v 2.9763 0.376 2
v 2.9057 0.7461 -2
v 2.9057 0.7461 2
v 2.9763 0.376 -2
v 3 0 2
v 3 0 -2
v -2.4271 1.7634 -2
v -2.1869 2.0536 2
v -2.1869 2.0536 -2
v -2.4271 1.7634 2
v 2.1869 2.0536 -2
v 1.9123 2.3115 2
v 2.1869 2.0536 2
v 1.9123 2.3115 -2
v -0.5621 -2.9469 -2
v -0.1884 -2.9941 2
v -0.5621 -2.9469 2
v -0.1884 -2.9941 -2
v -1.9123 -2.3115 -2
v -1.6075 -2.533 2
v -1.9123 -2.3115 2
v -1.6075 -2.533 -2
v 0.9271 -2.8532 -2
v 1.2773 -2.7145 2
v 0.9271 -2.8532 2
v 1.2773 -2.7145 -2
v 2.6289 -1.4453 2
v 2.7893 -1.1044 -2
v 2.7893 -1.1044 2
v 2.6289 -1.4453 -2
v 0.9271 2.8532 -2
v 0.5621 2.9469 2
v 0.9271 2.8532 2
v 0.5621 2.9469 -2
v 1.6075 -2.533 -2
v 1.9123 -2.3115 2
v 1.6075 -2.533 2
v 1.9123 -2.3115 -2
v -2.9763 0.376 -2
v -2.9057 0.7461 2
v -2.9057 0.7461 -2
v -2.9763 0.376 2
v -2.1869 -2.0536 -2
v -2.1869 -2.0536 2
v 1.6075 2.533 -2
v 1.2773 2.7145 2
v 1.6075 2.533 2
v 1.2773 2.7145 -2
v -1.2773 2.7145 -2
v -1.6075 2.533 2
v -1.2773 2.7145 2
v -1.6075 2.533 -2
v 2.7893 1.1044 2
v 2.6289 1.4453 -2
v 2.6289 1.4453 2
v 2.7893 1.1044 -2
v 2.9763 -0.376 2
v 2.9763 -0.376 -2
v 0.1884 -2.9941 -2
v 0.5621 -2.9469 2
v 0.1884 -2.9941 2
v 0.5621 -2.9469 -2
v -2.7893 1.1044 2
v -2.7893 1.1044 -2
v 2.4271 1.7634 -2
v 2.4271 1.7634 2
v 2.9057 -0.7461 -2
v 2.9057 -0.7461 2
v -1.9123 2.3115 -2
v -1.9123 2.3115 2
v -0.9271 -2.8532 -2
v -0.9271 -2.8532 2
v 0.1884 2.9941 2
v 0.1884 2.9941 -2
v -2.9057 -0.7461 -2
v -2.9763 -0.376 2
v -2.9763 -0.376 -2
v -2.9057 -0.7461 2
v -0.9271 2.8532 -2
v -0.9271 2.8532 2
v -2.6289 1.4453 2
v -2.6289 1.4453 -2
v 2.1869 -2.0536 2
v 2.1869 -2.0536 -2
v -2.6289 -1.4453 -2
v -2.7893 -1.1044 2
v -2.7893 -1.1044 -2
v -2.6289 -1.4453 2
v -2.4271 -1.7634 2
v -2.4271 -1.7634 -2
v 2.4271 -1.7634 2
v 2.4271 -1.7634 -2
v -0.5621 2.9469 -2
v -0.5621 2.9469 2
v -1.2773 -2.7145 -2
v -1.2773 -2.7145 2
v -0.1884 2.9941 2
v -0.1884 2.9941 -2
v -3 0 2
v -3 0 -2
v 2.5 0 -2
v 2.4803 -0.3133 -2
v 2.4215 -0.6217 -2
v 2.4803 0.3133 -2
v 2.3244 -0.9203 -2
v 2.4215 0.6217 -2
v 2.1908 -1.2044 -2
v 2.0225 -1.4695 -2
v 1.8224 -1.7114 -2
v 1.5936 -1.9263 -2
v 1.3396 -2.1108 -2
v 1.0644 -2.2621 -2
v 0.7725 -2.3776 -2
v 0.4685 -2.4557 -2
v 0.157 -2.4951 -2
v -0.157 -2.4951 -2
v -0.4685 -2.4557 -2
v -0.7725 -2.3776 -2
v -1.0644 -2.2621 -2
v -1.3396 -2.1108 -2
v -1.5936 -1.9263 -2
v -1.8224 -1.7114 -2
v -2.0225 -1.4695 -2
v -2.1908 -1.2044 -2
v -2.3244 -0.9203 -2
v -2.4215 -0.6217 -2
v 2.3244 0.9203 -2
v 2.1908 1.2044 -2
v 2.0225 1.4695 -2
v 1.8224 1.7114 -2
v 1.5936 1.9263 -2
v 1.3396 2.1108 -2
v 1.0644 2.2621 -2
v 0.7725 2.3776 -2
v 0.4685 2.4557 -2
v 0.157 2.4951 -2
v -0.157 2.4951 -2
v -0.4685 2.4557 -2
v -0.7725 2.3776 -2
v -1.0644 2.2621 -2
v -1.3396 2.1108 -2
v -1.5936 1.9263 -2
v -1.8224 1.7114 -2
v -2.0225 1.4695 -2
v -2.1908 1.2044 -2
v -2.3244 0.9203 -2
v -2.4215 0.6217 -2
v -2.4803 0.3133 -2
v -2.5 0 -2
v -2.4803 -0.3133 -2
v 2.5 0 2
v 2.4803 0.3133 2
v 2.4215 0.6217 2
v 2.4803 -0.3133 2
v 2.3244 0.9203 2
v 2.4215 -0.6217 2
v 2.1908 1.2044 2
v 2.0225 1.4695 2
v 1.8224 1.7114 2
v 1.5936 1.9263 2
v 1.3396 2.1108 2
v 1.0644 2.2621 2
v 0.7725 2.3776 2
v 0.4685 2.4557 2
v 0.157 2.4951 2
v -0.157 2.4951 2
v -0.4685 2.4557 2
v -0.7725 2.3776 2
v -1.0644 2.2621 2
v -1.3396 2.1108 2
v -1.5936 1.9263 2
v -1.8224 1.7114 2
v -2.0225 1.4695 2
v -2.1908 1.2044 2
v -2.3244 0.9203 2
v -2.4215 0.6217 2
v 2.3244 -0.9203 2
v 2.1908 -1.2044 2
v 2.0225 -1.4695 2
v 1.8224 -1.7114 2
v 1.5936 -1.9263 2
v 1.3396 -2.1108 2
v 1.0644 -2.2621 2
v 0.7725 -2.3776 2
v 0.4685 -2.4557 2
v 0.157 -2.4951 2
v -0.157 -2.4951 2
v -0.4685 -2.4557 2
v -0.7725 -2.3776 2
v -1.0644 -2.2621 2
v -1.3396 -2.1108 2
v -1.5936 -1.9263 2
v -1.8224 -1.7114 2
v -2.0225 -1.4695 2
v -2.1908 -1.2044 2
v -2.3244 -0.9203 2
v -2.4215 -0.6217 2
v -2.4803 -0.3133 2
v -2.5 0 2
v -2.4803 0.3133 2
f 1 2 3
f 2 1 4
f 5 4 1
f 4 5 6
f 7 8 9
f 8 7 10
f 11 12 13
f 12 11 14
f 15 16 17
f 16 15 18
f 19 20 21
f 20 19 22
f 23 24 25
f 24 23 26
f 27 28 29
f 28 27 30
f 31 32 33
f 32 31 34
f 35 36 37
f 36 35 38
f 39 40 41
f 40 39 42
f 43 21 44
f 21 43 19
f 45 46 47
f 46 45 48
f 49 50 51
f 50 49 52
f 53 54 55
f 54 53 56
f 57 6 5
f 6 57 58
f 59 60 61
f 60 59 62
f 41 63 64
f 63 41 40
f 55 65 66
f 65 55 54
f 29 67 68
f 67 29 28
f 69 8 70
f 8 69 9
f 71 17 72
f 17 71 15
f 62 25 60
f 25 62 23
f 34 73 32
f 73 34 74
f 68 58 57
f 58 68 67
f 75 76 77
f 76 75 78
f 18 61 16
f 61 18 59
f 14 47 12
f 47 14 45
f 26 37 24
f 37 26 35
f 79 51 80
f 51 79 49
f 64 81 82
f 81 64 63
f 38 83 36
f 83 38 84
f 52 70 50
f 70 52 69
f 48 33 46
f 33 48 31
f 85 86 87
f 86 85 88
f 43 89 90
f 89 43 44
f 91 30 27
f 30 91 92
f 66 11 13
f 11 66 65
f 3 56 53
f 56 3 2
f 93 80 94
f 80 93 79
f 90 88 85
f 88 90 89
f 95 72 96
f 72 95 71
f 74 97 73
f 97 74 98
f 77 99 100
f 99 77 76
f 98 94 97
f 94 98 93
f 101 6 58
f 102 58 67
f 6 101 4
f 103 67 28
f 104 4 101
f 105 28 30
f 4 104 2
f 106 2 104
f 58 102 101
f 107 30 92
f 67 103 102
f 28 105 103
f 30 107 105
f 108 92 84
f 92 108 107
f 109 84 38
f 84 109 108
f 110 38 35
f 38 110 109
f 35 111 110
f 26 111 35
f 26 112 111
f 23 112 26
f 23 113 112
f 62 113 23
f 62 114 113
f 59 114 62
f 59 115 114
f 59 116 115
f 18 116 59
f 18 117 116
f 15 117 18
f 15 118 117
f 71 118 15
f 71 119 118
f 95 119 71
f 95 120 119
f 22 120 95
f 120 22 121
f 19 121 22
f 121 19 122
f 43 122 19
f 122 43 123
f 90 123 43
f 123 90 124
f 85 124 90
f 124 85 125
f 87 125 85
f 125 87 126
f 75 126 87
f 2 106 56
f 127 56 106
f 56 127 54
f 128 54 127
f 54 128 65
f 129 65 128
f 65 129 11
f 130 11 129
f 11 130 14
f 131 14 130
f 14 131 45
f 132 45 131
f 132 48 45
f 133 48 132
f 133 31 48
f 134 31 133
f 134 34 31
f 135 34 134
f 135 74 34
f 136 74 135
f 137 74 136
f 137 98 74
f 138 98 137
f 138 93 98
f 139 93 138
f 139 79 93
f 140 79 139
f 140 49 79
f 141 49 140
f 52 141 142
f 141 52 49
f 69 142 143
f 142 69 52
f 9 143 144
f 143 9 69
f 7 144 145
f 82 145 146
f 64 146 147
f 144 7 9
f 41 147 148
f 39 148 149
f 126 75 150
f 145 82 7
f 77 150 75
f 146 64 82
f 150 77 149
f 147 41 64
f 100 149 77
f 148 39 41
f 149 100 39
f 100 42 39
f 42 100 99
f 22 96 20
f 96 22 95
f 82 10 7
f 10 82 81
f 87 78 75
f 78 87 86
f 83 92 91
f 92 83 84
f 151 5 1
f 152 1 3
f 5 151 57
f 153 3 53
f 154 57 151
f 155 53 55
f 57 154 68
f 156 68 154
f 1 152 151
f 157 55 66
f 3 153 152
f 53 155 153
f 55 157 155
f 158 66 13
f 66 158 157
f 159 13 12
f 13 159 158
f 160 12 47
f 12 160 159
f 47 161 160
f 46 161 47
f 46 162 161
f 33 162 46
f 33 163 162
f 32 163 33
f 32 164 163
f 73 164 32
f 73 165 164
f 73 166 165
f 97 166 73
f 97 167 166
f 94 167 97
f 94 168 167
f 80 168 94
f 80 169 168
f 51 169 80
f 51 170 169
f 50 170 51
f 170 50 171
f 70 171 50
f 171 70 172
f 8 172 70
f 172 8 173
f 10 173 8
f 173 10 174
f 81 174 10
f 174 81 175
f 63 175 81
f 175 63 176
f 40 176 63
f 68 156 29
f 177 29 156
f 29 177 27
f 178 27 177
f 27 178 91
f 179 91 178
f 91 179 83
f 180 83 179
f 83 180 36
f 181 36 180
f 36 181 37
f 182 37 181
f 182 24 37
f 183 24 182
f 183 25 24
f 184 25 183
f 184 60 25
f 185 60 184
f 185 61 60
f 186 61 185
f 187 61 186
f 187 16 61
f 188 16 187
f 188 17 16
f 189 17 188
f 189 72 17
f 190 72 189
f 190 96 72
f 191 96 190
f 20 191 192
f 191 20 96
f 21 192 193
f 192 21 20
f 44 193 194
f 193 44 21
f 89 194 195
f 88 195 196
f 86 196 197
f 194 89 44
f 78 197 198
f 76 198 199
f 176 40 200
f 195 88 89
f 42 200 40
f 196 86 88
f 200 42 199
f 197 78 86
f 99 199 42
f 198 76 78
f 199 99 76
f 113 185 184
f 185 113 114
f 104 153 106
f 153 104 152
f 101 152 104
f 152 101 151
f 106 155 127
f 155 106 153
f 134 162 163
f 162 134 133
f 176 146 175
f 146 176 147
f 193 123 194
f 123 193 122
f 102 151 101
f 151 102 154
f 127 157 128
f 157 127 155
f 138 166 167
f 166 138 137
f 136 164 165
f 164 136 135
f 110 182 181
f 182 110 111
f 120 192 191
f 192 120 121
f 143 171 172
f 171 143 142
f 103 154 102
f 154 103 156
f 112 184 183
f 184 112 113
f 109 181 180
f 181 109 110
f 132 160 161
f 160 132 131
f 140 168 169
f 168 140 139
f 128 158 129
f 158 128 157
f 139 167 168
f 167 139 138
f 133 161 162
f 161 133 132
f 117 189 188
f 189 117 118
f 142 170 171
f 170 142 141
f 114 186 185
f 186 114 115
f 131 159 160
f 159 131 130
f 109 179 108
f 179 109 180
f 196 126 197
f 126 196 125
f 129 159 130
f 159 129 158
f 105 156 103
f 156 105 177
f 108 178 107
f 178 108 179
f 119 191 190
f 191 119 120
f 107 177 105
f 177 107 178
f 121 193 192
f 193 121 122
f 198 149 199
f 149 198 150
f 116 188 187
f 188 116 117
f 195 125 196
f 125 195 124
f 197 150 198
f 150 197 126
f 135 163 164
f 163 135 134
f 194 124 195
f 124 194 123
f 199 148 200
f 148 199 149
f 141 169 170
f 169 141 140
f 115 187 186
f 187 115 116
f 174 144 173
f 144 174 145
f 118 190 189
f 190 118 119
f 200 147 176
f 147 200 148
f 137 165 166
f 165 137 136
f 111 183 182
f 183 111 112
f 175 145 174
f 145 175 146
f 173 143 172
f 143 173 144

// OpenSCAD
$fn = 50;


difference() {
	union() {
		translate(v = [0, 0, -2.0000000000]) {
			cylinder(h = 4, r = 3.0000000000);
		}
	}
	union() {
		translate(v = [0, 0, -100.0000000000]) {
			cylinder(h = 200, r = 2.5000000000);
		}
	}
}
